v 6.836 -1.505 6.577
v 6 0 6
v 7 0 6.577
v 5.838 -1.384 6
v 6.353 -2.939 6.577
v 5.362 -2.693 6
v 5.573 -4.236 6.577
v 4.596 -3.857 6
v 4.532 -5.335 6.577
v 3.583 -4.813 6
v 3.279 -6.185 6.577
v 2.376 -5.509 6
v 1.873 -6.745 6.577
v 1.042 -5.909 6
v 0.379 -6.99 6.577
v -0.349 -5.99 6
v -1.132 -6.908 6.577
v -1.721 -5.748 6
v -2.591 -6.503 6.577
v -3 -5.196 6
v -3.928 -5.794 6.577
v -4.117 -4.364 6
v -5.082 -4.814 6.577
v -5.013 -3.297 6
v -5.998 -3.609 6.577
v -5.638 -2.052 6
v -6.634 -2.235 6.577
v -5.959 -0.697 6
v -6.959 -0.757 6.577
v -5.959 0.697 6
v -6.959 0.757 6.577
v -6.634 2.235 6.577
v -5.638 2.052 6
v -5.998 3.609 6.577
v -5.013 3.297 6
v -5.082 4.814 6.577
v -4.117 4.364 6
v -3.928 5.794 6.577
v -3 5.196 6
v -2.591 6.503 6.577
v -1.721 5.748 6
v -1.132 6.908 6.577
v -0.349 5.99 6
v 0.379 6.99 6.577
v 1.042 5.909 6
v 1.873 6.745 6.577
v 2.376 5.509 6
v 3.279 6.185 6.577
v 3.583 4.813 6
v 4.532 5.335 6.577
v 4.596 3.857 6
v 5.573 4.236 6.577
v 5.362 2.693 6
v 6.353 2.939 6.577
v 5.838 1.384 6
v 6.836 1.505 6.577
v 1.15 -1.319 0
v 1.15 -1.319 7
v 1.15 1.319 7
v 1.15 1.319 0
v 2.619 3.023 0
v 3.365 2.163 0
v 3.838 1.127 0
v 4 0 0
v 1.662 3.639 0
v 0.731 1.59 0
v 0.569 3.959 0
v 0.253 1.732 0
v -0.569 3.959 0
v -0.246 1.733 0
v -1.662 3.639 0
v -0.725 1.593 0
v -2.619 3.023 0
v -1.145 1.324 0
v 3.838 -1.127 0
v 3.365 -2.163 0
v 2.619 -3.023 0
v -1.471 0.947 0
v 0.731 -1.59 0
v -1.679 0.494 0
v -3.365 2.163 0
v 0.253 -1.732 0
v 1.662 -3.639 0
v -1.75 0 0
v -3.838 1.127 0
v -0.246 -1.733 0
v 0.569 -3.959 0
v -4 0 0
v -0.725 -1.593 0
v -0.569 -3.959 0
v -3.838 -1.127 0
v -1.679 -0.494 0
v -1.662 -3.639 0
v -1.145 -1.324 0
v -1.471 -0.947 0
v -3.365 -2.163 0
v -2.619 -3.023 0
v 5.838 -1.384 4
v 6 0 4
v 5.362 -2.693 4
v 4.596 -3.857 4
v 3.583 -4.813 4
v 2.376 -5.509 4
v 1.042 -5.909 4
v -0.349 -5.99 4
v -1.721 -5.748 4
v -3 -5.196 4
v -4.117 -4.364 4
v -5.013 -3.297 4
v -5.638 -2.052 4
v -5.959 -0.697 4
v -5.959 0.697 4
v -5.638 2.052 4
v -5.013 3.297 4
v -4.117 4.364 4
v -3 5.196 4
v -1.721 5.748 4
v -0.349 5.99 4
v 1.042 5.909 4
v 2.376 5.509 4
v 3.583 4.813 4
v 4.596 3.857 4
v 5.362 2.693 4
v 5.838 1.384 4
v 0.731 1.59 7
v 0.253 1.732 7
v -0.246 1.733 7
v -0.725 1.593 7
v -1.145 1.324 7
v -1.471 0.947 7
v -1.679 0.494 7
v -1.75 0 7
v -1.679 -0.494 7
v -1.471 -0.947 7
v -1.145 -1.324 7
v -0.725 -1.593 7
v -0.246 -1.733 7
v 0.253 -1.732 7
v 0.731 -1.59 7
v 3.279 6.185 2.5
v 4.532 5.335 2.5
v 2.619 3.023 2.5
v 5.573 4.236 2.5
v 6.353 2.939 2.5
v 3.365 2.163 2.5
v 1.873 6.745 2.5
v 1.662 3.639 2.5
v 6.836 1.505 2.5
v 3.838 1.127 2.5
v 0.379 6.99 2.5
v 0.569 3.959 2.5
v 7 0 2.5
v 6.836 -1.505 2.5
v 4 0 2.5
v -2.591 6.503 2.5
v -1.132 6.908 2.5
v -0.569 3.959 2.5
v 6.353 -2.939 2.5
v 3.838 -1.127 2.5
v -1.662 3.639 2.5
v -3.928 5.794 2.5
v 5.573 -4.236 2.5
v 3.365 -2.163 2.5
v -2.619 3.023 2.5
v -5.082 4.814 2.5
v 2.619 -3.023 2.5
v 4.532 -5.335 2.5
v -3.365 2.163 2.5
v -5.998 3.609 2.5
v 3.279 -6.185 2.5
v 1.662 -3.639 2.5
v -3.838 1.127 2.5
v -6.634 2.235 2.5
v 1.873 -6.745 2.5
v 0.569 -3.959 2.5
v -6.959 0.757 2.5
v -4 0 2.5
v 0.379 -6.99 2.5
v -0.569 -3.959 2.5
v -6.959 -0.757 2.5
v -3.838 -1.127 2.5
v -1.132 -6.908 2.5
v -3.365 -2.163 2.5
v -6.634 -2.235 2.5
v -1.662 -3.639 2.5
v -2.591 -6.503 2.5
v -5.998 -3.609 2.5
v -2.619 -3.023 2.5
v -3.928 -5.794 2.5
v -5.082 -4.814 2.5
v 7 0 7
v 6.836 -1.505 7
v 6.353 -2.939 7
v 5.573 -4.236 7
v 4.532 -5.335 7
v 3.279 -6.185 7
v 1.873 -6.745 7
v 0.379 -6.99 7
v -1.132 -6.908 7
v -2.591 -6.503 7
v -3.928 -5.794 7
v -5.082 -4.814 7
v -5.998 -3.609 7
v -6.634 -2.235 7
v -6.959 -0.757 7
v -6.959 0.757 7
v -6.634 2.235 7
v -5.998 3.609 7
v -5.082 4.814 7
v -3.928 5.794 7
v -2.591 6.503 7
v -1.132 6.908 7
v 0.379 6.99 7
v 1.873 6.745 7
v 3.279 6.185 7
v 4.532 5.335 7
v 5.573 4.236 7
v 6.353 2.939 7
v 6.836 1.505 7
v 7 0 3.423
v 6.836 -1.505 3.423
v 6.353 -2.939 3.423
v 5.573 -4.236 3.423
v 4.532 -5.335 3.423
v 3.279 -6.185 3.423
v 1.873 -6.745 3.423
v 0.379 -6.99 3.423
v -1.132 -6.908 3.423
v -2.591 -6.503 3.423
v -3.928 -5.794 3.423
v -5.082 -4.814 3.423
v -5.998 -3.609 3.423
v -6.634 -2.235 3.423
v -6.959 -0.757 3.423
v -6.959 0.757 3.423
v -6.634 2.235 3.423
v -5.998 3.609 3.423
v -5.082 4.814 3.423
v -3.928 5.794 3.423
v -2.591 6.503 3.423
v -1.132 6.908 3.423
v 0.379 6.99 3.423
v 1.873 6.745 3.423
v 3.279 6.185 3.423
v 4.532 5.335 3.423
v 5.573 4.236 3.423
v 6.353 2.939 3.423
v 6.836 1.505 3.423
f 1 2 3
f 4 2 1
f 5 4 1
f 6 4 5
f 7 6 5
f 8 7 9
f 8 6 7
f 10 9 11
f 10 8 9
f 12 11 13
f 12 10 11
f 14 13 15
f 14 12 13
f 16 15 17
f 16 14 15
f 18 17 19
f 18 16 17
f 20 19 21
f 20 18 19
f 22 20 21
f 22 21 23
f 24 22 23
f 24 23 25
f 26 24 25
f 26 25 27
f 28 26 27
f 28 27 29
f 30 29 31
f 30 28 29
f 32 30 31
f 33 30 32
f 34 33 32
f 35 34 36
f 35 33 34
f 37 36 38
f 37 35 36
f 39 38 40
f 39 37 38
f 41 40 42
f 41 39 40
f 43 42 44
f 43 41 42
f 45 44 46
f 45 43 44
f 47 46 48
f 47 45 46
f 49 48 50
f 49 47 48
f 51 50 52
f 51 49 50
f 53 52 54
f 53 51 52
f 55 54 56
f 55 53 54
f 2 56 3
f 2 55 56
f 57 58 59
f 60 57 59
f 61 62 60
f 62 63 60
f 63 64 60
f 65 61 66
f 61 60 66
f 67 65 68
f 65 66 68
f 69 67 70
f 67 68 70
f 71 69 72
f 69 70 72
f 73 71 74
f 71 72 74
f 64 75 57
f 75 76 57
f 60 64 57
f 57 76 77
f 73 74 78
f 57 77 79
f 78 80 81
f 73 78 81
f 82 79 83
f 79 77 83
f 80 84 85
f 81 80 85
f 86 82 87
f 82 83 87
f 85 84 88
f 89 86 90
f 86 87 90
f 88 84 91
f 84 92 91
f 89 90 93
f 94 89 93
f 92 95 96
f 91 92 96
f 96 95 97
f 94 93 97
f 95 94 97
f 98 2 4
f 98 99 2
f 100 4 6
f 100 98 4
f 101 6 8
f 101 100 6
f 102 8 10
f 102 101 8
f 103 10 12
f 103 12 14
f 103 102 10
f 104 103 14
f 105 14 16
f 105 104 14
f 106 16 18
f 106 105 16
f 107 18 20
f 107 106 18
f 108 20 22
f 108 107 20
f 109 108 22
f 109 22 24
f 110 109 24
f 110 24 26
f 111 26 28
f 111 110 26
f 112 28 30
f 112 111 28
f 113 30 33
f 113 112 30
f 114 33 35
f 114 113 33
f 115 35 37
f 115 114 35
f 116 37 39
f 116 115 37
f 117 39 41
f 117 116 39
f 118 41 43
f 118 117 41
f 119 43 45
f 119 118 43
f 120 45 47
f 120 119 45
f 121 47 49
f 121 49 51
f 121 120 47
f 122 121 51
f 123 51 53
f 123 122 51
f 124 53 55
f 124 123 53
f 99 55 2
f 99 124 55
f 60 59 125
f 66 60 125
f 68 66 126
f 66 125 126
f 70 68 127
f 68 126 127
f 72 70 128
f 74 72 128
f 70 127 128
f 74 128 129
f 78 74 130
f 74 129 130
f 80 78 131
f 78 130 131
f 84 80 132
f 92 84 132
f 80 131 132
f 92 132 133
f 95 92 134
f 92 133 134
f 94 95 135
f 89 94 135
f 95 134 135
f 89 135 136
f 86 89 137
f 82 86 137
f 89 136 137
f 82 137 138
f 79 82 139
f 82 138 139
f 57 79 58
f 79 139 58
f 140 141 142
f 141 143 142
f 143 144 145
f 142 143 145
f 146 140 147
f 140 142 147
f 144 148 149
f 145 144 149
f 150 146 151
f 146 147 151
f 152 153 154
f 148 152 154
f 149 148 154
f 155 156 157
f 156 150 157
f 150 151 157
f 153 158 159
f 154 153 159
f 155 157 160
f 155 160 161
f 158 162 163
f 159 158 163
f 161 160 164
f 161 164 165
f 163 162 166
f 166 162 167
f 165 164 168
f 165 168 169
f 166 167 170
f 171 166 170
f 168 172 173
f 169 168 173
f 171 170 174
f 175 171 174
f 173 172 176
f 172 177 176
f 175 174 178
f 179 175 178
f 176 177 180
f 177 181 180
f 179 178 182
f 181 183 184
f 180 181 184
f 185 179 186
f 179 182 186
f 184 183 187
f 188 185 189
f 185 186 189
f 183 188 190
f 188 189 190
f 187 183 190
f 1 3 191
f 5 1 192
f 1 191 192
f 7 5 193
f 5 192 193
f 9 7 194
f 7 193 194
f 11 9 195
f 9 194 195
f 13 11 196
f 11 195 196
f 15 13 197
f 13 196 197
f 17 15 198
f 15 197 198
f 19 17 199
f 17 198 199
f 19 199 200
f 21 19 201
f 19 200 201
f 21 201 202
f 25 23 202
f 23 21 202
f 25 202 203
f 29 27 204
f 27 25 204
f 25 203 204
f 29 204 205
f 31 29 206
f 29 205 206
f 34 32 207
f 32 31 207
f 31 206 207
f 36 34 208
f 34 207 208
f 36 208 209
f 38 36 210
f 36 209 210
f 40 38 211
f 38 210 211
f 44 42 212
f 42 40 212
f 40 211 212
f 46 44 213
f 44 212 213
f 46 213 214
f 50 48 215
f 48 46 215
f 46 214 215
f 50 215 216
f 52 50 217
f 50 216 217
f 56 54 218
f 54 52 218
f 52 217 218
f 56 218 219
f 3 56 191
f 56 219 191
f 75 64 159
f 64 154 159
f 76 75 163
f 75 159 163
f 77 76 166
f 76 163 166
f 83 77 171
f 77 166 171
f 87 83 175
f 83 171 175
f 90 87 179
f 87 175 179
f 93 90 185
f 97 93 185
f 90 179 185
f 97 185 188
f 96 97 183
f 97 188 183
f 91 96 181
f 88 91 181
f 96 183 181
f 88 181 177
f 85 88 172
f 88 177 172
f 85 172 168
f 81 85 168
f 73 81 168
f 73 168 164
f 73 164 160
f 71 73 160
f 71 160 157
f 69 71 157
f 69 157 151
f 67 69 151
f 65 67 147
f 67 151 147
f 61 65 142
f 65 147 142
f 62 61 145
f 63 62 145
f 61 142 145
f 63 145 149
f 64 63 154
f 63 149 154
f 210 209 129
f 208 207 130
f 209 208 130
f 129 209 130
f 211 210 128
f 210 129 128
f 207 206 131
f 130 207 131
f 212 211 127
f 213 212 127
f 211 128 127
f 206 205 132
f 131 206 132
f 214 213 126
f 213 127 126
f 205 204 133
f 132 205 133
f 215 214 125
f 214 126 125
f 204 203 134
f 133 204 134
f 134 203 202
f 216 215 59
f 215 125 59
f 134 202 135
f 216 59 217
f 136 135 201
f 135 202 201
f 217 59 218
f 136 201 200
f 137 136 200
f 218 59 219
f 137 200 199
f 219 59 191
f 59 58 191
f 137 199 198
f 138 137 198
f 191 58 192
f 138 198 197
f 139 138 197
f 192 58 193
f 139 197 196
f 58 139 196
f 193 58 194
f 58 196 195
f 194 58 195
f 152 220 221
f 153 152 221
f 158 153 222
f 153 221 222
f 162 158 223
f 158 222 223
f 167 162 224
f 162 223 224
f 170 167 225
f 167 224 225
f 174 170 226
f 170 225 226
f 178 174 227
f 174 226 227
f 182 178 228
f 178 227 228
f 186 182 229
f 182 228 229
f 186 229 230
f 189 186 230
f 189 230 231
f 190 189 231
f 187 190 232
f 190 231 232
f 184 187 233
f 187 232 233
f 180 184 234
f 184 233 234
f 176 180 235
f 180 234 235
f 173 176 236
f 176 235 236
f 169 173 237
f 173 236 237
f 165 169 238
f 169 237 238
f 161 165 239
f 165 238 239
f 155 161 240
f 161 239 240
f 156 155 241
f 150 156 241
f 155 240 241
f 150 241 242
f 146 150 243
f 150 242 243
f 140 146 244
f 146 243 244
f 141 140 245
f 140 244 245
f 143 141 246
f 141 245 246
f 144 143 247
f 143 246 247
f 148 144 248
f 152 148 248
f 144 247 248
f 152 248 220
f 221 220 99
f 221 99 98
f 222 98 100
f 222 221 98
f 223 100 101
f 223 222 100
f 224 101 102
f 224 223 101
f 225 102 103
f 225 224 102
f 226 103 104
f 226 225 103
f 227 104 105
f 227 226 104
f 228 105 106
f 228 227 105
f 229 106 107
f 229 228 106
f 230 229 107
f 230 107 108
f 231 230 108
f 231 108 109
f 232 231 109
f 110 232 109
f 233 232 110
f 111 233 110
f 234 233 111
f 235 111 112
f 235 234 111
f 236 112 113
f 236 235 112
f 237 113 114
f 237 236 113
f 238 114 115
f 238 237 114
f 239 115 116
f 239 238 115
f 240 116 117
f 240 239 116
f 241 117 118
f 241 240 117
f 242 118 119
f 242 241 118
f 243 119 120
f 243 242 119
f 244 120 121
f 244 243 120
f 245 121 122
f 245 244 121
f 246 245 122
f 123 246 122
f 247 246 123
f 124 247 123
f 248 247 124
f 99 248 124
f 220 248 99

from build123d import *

# Parameters (mm, degrees)
F3_DEPTH = 7.001


with BuildPart() as f1:
    # F0 (on Front) → F1 (revolve)
    with BuildSketch(Plane.XZ):
        Polygon((0, 7), (0, 0), (4, 0), (4, 2.5), (7, 2.5), (7, 7), align=None)
    revolve(axis=Axis((0, 0, 3.5), (0, 0, -1)))

    # F2 (on face) → F3 (cut, through all)
    with BuildSketch(Plane.XY.offset(7)):
        with BuildLine():
            Line((1.15, -1.319091), (1.15, 1.319091))
            ThreePointArc((1.15, 1.319091), (-1.75, 0), (1.15, -1.319091))
        make_face()
    extrude(amount=-F3_DEPTH, mode=Mode.SUBTRACT)

    # F4 (on Front) → F5 (revolve, cut)
    with BuildSketch(Plane.XZ):
        Polygon((6, 4), (8.598076, 2.5), (8.598076, 7.5), (6, 6), align=None)
    revolve(axis=Axis((0, 0, 7), (0, 0, -1)), mode=Mode.SUBTRACT)


solid = f1.part
